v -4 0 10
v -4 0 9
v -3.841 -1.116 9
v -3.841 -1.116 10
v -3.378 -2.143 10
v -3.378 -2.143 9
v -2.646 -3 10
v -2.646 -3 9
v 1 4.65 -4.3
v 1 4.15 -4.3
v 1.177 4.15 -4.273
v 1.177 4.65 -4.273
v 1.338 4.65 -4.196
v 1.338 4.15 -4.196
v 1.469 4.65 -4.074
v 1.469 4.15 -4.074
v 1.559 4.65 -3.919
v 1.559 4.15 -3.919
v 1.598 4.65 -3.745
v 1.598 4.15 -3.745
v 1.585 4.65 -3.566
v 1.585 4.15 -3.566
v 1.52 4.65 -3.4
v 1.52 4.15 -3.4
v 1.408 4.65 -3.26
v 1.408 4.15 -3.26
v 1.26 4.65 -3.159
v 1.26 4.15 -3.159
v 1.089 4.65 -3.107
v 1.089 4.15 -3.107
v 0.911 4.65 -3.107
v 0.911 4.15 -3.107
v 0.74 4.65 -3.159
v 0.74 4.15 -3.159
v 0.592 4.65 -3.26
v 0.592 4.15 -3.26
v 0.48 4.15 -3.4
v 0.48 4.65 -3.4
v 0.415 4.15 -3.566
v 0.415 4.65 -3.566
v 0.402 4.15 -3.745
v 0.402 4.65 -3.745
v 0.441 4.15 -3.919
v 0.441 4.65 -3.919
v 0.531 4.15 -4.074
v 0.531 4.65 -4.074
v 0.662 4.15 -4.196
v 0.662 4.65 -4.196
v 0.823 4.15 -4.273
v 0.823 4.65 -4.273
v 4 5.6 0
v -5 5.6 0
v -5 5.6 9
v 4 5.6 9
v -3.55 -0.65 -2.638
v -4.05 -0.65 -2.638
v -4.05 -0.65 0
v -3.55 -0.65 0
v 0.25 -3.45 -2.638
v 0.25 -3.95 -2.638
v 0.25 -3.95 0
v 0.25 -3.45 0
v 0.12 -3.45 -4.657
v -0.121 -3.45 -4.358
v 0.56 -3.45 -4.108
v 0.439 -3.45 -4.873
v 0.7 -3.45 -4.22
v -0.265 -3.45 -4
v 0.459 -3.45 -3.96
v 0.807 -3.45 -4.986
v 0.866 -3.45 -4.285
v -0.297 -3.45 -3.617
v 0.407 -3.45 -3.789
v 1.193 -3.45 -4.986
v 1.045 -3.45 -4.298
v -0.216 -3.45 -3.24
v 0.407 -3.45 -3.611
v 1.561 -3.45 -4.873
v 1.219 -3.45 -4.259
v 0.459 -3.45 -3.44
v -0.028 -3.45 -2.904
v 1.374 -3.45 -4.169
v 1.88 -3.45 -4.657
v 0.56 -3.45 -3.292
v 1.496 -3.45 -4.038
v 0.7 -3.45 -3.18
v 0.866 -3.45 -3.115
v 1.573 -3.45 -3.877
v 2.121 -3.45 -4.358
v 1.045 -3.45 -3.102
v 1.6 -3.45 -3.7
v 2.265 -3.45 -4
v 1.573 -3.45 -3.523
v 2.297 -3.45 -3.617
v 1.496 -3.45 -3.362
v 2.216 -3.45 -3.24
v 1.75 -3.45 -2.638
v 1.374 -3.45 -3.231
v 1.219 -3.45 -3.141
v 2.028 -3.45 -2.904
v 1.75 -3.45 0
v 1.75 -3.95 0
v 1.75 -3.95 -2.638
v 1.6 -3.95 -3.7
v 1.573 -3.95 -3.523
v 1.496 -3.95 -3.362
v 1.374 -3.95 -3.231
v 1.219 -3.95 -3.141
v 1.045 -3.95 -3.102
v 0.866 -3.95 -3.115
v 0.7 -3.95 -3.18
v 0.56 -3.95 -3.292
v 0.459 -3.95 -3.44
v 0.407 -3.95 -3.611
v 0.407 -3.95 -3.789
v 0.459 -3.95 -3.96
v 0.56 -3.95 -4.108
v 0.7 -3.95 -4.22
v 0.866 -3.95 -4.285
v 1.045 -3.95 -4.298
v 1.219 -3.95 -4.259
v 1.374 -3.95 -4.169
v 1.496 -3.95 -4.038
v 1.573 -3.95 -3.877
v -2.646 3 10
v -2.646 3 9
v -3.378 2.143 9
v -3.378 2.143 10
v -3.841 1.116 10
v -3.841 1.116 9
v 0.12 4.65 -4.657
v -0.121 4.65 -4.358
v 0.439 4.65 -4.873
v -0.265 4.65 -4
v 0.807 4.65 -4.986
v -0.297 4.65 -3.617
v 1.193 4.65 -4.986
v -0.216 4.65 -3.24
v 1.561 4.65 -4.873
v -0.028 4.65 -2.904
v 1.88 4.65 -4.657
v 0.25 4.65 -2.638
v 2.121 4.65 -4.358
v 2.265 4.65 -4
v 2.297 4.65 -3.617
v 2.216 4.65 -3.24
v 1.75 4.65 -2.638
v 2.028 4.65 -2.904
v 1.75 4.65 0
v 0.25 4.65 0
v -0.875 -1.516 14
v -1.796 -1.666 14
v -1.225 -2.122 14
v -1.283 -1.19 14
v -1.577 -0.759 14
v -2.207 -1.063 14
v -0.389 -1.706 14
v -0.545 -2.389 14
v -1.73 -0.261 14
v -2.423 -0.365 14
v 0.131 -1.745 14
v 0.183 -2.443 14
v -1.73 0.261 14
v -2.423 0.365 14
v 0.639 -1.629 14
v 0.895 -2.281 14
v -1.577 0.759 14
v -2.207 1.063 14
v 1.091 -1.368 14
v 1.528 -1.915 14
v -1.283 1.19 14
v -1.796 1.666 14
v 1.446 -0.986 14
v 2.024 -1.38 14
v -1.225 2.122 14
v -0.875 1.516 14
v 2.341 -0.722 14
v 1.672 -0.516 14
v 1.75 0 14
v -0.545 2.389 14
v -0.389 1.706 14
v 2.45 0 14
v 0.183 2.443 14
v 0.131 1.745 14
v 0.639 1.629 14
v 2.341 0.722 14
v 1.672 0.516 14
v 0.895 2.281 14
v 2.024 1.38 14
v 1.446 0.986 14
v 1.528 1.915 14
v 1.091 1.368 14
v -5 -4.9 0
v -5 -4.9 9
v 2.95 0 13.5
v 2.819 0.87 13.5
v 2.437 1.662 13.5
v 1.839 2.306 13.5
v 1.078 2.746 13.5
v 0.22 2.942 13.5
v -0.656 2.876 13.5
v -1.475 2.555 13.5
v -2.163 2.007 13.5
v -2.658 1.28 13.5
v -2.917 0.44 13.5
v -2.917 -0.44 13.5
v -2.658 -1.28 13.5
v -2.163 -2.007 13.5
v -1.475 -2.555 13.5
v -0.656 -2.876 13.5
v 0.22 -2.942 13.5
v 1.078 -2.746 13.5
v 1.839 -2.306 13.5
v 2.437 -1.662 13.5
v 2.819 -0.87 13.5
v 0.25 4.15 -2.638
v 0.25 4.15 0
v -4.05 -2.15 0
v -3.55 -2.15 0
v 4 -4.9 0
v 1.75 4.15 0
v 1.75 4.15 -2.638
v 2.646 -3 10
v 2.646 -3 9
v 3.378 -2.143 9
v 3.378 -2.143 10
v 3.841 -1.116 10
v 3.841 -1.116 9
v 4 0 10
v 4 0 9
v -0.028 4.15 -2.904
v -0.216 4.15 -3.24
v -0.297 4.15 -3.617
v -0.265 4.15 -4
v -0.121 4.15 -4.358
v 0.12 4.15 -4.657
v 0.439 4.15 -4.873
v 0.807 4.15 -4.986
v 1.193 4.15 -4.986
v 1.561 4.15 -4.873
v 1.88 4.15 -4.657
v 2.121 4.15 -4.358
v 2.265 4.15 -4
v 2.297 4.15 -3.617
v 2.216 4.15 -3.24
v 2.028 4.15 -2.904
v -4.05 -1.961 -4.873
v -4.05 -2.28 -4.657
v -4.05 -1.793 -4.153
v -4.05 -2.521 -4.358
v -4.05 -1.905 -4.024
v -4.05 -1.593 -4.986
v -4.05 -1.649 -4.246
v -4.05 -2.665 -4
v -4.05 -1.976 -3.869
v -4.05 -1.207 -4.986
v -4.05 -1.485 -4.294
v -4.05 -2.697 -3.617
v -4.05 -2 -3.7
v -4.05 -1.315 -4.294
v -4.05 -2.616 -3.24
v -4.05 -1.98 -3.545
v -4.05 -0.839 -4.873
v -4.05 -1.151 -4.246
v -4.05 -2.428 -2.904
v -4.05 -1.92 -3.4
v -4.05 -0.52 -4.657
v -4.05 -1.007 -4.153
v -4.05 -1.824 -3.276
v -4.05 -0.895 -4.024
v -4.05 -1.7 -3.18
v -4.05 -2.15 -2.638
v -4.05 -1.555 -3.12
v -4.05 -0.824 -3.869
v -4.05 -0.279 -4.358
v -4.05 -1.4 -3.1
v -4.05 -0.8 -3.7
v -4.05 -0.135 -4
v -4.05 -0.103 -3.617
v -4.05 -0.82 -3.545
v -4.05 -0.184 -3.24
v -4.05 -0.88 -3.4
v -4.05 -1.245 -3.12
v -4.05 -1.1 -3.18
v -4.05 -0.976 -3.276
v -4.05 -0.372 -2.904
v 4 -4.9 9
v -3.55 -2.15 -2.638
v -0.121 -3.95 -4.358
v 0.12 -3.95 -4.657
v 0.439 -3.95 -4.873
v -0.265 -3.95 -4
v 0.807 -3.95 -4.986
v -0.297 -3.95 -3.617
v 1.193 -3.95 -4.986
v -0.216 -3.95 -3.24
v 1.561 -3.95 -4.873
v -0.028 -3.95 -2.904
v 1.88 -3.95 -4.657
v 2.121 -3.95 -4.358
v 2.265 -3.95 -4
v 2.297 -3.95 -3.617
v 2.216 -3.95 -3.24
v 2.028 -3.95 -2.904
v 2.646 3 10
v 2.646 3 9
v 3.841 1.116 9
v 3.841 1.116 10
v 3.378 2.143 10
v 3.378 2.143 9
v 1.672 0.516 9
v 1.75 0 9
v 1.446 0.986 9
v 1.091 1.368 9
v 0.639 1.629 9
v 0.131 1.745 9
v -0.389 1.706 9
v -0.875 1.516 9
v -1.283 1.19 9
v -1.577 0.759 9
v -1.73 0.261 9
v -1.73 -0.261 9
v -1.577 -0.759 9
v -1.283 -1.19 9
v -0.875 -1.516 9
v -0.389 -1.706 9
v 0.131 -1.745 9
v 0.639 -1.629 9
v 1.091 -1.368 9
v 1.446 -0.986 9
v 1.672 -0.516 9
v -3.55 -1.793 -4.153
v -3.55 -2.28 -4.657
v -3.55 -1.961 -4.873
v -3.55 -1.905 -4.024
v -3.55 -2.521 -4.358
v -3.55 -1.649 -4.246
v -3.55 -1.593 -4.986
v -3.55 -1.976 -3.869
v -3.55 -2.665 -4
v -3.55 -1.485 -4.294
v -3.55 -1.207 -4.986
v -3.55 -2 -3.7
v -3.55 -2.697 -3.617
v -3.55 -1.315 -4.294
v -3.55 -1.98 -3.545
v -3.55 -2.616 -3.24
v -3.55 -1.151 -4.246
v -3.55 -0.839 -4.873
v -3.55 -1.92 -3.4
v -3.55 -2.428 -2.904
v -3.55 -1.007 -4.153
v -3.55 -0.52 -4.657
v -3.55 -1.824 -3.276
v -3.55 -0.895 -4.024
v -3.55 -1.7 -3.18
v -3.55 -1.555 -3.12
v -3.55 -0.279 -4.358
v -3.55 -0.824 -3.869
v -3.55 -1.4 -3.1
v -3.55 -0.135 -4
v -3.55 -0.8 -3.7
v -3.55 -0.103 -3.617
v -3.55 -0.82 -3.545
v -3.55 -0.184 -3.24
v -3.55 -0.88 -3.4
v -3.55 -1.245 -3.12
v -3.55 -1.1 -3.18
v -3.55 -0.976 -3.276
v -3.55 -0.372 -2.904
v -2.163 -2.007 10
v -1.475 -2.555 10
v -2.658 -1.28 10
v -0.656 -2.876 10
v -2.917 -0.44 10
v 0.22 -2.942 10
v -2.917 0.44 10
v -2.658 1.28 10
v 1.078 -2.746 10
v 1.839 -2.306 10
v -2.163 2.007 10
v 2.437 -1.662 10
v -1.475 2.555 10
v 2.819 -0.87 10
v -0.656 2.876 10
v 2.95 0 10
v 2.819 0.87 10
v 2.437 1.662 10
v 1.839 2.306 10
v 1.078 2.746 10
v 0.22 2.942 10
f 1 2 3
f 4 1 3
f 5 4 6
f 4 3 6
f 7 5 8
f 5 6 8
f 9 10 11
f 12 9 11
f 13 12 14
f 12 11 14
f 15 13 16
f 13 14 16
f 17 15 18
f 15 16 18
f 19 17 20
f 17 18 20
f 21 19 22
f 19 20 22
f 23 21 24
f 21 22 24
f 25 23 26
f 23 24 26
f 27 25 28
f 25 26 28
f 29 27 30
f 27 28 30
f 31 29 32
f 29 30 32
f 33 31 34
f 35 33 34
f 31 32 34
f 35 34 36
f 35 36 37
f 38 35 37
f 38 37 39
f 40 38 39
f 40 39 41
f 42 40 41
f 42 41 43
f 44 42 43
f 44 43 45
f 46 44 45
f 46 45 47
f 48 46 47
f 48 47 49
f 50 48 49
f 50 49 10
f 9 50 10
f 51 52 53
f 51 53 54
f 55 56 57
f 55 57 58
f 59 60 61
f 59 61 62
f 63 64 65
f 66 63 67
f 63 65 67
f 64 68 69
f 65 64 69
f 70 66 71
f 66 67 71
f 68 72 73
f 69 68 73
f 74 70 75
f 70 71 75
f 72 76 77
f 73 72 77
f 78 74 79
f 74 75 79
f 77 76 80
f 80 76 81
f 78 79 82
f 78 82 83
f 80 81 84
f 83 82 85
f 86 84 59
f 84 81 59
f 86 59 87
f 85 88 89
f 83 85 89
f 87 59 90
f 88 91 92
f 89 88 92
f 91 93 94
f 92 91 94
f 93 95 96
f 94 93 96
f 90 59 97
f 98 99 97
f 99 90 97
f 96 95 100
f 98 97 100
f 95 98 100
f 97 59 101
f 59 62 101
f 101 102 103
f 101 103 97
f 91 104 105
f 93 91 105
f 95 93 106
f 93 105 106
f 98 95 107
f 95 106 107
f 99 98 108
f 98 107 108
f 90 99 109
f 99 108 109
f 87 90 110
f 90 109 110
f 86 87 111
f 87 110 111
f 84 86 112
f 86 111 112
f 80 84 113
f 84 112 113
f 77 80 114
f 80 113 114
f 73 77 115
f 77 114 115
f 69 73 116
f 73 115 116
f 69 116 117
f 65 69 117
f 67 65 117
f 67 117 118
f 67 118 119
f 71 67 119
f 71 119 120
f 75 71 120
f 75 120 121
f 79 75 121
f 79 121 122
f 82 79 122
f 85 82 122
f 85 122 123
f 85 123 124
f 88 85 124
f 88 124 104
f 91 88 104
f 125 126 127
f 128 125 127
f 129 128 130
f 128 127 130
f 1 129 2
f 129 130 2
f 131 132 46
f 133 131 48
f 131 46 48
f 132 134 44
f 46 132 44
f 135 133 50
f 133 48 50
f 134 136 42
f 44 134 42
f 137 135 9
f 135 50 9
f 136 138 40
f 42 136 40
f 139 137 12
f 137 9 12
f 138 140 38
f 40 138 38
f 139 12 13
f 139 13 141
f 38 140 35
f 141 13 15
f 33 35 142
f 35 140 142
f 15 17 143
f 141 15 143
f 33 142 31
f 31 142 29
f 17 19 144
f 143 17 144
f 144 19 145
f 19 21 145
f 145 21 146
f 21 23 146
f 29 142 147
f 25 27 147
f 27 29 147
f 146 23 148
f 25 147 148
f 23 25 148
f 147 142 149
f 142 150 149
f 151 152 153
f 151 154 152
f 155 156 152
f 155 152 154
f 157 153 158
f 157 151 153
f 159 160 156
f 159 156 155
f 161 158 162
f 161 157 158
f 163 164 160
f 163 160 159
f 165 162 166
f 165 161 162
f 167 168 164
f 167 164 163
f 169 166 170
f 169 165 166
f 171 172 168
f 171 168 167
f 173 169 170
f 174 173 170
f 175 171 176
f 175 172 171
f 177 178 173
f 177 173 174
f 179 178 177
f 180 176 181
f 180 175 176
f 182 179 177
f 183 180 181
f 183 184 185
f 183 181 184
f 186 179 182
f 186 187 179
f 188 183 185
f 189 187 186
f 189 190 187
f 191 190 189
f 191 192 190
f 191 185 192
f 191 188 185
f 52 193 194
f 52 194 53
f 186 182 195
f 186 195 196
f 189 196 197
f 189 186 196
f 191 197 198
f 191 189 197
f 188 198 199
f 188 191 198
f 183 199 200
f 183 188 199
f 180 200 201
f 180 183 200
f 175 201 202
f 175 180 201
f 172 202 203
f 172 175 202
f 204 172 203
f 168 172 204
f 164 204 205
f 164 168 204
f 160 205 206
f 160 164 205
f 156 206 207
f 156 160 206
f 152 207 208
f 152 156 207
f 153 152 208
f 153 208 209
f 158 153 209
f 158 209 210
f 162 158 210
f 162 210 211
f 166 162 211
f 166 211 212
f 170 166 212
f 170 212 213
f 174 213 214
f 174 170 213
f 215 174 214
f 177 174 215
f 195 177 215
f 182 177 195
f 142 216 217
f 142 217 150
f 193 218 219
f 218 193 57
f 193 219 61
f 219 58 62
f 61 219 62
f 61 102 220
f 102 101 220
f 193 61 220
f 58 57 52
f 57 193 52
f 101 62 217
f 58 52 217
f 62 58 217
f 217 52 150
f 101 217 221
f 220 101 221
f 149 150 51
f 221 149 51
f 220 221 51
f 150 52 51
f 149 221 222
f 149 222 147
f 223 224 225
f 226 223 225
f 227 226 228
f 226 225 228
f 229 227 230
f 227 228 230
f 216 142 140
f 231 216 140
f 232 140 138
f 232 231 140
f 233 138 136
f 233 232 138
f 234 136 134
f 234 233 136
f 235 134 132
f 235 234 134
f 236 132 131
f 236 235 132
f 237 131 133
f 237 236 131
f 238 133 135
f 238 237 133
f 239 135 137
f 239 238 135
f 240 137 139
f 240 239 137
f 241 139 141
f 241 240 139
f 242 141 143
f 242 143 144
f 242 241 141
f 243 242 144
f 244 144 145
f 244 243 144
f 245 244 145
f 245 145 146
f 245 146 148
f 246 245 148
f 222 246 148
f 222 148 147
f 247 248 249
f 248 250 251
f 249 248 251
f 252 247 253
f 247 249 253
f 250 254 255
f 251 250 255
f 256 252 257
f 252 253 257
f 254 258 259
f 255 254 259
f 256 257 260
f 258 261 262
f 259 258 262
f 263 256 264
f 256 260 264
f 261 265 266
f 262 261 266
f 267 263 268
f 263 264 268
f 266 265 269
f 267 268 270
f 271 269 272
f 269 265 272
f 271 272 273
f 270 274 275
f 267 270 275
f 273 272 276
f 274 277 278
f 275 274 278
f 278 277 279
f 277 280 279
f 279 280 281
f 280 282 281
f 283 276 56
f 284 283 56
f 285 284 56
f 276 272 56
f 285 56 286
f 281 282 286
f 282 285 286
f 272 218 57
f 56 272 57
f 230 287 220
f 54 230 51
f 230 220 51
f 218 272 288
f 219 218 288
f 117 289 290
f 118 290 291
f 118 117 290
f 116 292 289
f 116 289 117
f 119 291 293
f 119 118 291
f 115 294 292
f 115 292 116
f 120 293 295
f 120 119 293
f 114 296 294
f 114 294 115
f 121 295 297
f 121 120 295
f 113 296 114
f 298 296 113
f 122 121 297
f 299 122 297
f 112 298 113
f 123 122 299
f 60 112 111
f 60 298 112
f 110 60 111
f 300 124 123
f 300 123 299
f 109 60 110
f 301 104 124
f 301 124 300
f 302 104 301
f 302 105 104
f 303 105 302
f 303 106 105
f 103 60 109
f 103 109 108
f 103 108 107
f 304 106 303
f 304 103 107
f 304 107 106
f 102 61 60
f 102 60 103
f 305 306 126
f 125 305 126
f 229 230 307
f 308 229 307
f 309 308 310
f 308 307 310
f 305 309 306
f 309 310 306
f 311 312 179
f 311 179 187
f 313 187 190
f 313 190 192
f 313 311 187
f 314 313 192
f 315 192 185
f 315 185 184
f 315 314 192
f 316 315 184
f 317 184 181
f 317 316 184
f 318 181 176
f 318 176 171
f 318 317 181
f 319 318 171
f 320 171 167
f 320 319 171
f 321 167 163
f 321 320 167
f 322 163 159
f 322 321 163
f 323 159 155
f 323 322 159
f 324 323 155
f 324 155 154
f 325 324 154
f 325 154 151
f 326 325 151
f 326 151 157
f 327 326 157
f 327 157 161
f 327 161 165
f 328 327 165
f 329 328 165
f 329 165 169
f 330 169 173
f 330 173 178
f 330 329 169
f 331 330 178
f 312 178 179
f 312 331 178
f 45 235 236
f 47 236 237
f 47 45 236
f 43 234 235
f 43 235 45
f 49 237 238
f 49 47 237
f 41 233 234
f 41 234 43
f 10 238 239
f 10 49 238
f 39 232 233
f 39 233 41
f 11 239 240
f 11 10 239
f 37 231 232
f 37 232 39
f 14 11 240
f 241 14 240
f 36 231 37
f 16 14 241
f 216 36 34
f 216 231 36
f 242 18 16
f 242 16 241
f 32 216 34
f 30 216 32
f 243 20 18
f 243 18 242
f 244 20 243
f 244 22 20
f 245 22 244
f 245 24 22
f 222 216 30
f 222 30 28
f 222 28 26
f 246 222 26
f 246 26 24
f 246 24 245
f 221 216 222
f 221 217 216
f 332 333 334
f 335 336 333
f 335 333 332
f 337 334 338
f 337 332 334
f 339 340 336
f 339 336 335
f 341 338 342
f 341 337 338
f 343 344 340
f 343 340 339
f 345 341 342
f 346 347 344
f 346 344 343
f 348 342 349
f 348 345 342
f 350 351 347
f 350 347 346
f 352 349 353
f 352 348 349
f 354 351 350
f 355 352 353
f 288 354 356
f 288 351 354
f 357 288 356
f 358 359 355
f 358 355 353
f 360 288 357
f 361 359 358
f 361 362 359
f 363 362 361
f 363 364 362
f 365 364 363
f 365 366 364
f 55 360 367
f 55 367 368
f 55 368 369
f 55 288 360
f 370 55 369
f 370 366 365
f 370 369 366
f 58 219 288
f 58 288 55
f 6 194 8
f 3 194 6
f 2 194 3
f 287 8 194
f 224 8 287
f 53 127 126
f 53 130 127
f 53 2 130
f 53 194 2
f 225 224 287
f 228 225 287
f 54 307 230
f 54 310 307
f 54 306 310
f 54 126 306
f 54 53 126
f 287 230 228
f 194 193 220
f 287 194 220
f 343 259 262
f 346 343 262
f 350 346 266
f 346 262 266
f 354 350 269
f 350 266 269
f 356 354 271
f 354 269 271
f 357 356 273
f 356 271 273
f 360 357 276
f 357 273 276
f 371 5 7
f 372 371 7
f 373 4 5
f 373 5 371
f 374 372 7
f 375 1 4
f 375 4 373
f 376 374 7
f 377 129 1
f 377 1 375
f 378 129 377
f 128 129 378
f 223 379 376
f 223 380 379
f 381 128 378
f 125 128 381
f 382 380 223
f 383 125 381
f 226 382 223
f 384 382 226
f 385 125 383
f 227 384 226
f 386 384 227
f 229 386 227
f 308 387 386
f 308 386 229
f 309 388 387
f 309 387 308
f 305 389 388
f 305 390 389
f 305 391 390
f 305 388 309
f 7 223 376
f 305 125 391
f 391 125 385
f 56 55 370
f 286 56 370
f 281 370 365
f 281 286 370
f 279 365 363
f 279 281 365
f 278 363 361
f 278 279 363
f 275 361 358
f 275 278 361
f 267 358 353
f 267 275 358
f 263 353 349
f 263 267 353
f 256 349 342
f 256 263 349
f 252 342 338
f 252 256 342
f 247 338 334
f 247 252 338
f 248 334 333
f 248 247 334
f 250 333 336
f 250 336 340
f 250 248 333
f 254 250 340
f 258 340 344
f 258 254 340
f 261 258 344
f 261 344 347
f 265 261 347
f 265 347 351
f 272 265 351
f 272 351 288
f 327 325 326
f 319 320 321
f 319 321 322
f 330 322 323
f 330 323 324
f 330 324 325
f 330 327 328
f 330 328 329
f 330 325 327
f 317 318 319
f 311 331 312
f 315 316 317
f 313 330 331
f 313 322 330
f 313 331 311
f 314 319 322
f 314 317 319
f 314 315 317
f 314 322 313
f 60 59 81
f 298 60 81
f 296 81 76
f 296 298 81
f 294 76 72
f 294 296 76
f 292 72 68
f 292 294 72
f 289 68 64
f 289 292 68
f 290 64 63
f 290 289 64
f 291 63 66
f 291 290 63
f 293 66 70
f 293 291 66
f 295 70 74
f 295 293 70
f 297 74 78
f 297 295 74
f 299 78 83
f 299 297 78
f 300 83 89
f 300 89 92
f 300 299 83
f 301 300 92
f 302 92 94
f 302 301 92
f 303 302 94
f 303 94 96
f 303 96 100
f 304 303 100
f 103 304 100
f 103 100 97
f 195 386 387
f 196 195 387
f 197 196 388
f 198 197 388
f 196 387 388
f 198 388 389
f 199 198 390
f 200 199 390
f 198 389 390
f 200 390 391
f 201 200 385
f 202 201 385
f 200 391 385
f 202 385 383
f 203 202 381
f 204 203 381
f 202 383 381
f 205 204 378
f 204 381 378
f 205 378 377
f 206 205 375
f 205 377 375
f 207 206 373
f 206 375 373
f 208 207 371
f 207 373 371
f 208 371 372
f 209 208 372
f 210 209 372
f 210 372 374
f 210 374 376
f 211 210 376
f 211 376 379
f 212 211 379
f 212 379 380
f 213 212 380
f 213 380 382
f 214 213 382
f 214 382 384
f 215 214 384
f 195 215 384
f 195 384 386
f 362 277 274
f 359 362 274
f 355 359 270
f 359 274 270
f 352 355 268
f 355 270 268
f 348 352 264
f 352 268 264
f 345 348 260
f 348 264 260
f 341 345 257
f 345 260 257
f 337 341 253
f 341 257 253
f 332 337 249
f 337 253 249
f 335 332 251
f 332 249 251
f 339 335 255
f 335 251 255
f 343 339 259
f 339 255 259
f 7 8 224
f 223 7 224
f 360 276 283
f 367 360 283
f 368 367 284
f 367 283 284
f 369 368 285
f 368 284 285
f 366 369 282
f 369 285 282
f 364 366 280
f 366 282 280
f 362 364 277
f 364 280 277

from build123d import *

# Parameters (mm, degrees)
SKETCH3_W           = 9
SKETCH3_H           = 10.5
SKETCH3_W_2         = 1.5
SKETCH3_H_2         = 0.5
SKETCH3_W_3         = 0.5
SKETCH3_H_3         = 1.5
BOSS_EXTRUDE1_DEPTH = 9
SKETCH5_R           = 2.95
BOSS_EXTRUDE4_DEPTH = 1
SKETCH5_3_R         = 2.95
SKETCH5_3_R_2       = 1.75
BOSS_EXTRUDE5_DEPTH = 5
SKETCH3_3_W         = 1.5
SKETCH3_3_H         = 0.5
SKETCH3_3_W_2       = 0.5
SKETCH3_3_H_2       = 1.5
BOSS_EXTRUDE6_DEPTH = 3.7
SKETCH6_R           = 1.3
SKETCH6_R_2         = 0.6
BOSS_EXTRUDE7_DEPTH = 0.5
CUT_EXTRUDE1_DEPTH  = 3.7
CUT_EXTRUDE2_DEPTH  = 3.7
SKETCH7_3_R         = 1.3
SKETCH7_3_R_2       = 0.6
BOSS_EXTRUDE8_DEPTH = 0.5
CUT_EXTRUDE3_DEPTH  = 3.7
SKETCH8_3_R         = 1.3
SKETCH8_3_R_2       = 0.6
BOSS_EXTRUDE9_DEPTH = 0.5
CHAMFER1_SIZE       = 0.5


with BuildPart() as part:
    # Sketch3 → Boss-Extrude1 (new body)
    with BuildSketch(Plane.XY):
        with Locations((-0.5, 0.35)):
            Rectangle(SKETCH3_W, SKETCH3_H)
        with Locations((1, -3.7)):
            Rectangle(SKETCH3_W_2, SKETCH3_H_2, mode=Mode.SUBTRACT)
        with Locations((-3.8, -1.4)):
            Rectangle(SKETCH3_W_3, SKETCH3_H_3, mode=Mode.SUBTRACT)
        with Locations((1, 4.4)):
            Rectangle(SKETCH3_W_2, SKETCH3_H_2, mode=Mode.SUBTRACT)
        with Locations((1, -3.7)):
            Rectangle(SKETCH3_W_2, SKETCH3_H_2)
        with Locations((-3.8, -1.4)):
            Rectangle(SKETCH3_W_3, SKETCH3_H_3)
        with Locations((1, 4.4)):
            Rectangle(SKETCH3_W_2, SKETCH3_H_2)
    extrude(amount=BOSS_EXTRUDE1_DEPTH)

    # Sketch5 → Boss-Extrude4 (add)
    with BuildSketch(Plane.XY.offset(9)):
        with BuildLine():
            ThreePointArc((-4, 0), (-3.645751311, -1.645751311), (-2.645751311, -3))
            Line((-2.645751311, -3), (2.645751311, -3))
            ThreePointArc((2.645751311, -3), (3.645751311, -1.645751311), (4, 0))
            ThreePointArc((4, 0), (3.645751311, 1.645751311), (2.645751311, 3))
            Line((2.645751311, 3), (-2.645751311, 3))
            ThreePointArc((-2.645751311, 3), (-3.645751311, 1.645751311), (-4, 0))
        make_face()
        Circle(SKETCH5_R, mode=Mode.SUBTRACT)
    extrude(amount=BOSS_EXTRUDE4_DEPTH)

    # Sketch5<3> → Boss-Extrude5 (add)
    with BuildSketch(Plane.XY.offset(9)):
        Circle(SKETCH5_3_R)
        Circle(SKETCH5_3_R_2, mode=Mode.SUBTRACT)
    extrude(amount=BOSS_EXTRUDE5_DEPTH)

    # Sketch3<3> → Boss-Extrude6 (add)
    with BuildSketch(Plane.XY):
        with Locations((1, -3.7)):
            Rectangle(SKETCH3_3_W, SKETCH3_3_H)
        with Locations((-3.8, -1.4)):
            Rectangle(SKETCH3_3_W_2, SKETCH3_3_H_2)
        with Locations((1, 4.4)):
            Rectangle(SKETCH3_3_W, SKETCH3_3_H)
    extrude(amount=-BOSS_EXTRUDE6_DEPTH)

    # Sketch6 → Boss-Extrude7 (add)
    with BuildSketch(Plane.XZ.offset(3.95)):
        with Locations((1, -3.7)):
            Circle(SKETCH6_R)
        with Locations((1, -3.7)):
            Circle(SKETCH6_R_2, mode=Mode.SUBTRACT)
    extrude(amount=-BOSS_EXTRUDE7_DEPTH)

    # Sketch6<2> → Cut-Extrude1 (cut)
    with BuildSketch(Plane.XZ.offset(3.95)):
        with BuildLine():
            Line((0.4, -3.7), (1.6, -3.7))
            ThreePointArc((1.6, -3.7), (1, -3.1), (0.4, -3.7))
        make_face()
        with BuildLine():
            ThreePointArc((0.4, -3.7), (1, -4.3), (1.6, -3.7))
            Line((1.6, -3.7), (0.4, -3.7))
        make_face()
    extrude(amount=-CUT_EXTRUDE1_DEPTH, mode=Mode.SUBTRACT)

    # Sketch7 → Cut-Extrude2 (cut)
    with BuildSketch(Plane.XZ.offset(-4.15)):
        with BuildLine():
            Line((0.4, -3.7), (1.6, -3.7))
            ThreePointArc((1.6, -3.7), (1, -3.1), (0.4, -3.7))
        make_face()
        with BuildLine():
            ThreePointArc((0.4, -3.7), (1, -4.3), (1.6, -3.7))
            Line((1.6, -3.7), (0.4, -3.7))
        make_face()
    extrude(amount=-CUT_EXTRUDE2_DEPTH, mode=Mode.SUBTRACT)

    # Sketch7<3> → Boss-Extrude8 (add)
    with BuildSketch(Plane.XZ.offset(-4.15)):
        with Locations((1, -3.7)):
            Circle(SKETCH7_3_R)
        with Locations(Location((1, -3.7, 0), (0, 0, 270))):
            Circle(SKETCH7_3_R_2, mode=Mode.SUBTRACT)
    extrude(amount=-BOSS_EXTRUDE8_DEPTH)

    # Sketch8 → Cut-Extrude3 (cut)
    with BuildSketch(Plane.ZY.offset(4.05)):
        with BuildLine():
            ThreePointArc((-3.7, -2), (-3.275735931, -1.824264069), (-3.1, -1.4))
            ThreePointArc((-3.1, -1.4), (-3.275735931, -0.975735931), (-3.7, -0.8))
            Line((-3.7, -0.8), (-3.7, -2))
        make_face()
        with BuildLine():
            Line((-3.7, -2), (-3.7, -0.8))
            ThreePointArc((-3.7, -0.8), (-4.3, -1.4), (-3.7, -2))
        make_face()
    extrude(amount=-CUT_EXTRUDE3_DEPTH, mode=Mode.SUBTRACT)

    # Sketch8<3> → Boss-Extrude9 (add)
    with BuildSketch(Plane.ZY.offset(4.05)):
        with Locations((-3.7, -1.4)):
            Circle(SKETCH8_3_R)
        with Locations((-3.7, -1.4)):
            Circle(SKETCH8_3_R_2, mode=Mode.SUBTRACT)
    extrude(amount=-BOSS_EXTRUDE9_DEPTH)

    # Chamfer1
    chamfer1_edges = [part.edges().sort_by_distance(p)[0] for p in [
        (-2.95, 0, 14),
    ]]
    chamfer(chamfer1_edges, length=CHAMFER1_SIZE)


solid = part.part
